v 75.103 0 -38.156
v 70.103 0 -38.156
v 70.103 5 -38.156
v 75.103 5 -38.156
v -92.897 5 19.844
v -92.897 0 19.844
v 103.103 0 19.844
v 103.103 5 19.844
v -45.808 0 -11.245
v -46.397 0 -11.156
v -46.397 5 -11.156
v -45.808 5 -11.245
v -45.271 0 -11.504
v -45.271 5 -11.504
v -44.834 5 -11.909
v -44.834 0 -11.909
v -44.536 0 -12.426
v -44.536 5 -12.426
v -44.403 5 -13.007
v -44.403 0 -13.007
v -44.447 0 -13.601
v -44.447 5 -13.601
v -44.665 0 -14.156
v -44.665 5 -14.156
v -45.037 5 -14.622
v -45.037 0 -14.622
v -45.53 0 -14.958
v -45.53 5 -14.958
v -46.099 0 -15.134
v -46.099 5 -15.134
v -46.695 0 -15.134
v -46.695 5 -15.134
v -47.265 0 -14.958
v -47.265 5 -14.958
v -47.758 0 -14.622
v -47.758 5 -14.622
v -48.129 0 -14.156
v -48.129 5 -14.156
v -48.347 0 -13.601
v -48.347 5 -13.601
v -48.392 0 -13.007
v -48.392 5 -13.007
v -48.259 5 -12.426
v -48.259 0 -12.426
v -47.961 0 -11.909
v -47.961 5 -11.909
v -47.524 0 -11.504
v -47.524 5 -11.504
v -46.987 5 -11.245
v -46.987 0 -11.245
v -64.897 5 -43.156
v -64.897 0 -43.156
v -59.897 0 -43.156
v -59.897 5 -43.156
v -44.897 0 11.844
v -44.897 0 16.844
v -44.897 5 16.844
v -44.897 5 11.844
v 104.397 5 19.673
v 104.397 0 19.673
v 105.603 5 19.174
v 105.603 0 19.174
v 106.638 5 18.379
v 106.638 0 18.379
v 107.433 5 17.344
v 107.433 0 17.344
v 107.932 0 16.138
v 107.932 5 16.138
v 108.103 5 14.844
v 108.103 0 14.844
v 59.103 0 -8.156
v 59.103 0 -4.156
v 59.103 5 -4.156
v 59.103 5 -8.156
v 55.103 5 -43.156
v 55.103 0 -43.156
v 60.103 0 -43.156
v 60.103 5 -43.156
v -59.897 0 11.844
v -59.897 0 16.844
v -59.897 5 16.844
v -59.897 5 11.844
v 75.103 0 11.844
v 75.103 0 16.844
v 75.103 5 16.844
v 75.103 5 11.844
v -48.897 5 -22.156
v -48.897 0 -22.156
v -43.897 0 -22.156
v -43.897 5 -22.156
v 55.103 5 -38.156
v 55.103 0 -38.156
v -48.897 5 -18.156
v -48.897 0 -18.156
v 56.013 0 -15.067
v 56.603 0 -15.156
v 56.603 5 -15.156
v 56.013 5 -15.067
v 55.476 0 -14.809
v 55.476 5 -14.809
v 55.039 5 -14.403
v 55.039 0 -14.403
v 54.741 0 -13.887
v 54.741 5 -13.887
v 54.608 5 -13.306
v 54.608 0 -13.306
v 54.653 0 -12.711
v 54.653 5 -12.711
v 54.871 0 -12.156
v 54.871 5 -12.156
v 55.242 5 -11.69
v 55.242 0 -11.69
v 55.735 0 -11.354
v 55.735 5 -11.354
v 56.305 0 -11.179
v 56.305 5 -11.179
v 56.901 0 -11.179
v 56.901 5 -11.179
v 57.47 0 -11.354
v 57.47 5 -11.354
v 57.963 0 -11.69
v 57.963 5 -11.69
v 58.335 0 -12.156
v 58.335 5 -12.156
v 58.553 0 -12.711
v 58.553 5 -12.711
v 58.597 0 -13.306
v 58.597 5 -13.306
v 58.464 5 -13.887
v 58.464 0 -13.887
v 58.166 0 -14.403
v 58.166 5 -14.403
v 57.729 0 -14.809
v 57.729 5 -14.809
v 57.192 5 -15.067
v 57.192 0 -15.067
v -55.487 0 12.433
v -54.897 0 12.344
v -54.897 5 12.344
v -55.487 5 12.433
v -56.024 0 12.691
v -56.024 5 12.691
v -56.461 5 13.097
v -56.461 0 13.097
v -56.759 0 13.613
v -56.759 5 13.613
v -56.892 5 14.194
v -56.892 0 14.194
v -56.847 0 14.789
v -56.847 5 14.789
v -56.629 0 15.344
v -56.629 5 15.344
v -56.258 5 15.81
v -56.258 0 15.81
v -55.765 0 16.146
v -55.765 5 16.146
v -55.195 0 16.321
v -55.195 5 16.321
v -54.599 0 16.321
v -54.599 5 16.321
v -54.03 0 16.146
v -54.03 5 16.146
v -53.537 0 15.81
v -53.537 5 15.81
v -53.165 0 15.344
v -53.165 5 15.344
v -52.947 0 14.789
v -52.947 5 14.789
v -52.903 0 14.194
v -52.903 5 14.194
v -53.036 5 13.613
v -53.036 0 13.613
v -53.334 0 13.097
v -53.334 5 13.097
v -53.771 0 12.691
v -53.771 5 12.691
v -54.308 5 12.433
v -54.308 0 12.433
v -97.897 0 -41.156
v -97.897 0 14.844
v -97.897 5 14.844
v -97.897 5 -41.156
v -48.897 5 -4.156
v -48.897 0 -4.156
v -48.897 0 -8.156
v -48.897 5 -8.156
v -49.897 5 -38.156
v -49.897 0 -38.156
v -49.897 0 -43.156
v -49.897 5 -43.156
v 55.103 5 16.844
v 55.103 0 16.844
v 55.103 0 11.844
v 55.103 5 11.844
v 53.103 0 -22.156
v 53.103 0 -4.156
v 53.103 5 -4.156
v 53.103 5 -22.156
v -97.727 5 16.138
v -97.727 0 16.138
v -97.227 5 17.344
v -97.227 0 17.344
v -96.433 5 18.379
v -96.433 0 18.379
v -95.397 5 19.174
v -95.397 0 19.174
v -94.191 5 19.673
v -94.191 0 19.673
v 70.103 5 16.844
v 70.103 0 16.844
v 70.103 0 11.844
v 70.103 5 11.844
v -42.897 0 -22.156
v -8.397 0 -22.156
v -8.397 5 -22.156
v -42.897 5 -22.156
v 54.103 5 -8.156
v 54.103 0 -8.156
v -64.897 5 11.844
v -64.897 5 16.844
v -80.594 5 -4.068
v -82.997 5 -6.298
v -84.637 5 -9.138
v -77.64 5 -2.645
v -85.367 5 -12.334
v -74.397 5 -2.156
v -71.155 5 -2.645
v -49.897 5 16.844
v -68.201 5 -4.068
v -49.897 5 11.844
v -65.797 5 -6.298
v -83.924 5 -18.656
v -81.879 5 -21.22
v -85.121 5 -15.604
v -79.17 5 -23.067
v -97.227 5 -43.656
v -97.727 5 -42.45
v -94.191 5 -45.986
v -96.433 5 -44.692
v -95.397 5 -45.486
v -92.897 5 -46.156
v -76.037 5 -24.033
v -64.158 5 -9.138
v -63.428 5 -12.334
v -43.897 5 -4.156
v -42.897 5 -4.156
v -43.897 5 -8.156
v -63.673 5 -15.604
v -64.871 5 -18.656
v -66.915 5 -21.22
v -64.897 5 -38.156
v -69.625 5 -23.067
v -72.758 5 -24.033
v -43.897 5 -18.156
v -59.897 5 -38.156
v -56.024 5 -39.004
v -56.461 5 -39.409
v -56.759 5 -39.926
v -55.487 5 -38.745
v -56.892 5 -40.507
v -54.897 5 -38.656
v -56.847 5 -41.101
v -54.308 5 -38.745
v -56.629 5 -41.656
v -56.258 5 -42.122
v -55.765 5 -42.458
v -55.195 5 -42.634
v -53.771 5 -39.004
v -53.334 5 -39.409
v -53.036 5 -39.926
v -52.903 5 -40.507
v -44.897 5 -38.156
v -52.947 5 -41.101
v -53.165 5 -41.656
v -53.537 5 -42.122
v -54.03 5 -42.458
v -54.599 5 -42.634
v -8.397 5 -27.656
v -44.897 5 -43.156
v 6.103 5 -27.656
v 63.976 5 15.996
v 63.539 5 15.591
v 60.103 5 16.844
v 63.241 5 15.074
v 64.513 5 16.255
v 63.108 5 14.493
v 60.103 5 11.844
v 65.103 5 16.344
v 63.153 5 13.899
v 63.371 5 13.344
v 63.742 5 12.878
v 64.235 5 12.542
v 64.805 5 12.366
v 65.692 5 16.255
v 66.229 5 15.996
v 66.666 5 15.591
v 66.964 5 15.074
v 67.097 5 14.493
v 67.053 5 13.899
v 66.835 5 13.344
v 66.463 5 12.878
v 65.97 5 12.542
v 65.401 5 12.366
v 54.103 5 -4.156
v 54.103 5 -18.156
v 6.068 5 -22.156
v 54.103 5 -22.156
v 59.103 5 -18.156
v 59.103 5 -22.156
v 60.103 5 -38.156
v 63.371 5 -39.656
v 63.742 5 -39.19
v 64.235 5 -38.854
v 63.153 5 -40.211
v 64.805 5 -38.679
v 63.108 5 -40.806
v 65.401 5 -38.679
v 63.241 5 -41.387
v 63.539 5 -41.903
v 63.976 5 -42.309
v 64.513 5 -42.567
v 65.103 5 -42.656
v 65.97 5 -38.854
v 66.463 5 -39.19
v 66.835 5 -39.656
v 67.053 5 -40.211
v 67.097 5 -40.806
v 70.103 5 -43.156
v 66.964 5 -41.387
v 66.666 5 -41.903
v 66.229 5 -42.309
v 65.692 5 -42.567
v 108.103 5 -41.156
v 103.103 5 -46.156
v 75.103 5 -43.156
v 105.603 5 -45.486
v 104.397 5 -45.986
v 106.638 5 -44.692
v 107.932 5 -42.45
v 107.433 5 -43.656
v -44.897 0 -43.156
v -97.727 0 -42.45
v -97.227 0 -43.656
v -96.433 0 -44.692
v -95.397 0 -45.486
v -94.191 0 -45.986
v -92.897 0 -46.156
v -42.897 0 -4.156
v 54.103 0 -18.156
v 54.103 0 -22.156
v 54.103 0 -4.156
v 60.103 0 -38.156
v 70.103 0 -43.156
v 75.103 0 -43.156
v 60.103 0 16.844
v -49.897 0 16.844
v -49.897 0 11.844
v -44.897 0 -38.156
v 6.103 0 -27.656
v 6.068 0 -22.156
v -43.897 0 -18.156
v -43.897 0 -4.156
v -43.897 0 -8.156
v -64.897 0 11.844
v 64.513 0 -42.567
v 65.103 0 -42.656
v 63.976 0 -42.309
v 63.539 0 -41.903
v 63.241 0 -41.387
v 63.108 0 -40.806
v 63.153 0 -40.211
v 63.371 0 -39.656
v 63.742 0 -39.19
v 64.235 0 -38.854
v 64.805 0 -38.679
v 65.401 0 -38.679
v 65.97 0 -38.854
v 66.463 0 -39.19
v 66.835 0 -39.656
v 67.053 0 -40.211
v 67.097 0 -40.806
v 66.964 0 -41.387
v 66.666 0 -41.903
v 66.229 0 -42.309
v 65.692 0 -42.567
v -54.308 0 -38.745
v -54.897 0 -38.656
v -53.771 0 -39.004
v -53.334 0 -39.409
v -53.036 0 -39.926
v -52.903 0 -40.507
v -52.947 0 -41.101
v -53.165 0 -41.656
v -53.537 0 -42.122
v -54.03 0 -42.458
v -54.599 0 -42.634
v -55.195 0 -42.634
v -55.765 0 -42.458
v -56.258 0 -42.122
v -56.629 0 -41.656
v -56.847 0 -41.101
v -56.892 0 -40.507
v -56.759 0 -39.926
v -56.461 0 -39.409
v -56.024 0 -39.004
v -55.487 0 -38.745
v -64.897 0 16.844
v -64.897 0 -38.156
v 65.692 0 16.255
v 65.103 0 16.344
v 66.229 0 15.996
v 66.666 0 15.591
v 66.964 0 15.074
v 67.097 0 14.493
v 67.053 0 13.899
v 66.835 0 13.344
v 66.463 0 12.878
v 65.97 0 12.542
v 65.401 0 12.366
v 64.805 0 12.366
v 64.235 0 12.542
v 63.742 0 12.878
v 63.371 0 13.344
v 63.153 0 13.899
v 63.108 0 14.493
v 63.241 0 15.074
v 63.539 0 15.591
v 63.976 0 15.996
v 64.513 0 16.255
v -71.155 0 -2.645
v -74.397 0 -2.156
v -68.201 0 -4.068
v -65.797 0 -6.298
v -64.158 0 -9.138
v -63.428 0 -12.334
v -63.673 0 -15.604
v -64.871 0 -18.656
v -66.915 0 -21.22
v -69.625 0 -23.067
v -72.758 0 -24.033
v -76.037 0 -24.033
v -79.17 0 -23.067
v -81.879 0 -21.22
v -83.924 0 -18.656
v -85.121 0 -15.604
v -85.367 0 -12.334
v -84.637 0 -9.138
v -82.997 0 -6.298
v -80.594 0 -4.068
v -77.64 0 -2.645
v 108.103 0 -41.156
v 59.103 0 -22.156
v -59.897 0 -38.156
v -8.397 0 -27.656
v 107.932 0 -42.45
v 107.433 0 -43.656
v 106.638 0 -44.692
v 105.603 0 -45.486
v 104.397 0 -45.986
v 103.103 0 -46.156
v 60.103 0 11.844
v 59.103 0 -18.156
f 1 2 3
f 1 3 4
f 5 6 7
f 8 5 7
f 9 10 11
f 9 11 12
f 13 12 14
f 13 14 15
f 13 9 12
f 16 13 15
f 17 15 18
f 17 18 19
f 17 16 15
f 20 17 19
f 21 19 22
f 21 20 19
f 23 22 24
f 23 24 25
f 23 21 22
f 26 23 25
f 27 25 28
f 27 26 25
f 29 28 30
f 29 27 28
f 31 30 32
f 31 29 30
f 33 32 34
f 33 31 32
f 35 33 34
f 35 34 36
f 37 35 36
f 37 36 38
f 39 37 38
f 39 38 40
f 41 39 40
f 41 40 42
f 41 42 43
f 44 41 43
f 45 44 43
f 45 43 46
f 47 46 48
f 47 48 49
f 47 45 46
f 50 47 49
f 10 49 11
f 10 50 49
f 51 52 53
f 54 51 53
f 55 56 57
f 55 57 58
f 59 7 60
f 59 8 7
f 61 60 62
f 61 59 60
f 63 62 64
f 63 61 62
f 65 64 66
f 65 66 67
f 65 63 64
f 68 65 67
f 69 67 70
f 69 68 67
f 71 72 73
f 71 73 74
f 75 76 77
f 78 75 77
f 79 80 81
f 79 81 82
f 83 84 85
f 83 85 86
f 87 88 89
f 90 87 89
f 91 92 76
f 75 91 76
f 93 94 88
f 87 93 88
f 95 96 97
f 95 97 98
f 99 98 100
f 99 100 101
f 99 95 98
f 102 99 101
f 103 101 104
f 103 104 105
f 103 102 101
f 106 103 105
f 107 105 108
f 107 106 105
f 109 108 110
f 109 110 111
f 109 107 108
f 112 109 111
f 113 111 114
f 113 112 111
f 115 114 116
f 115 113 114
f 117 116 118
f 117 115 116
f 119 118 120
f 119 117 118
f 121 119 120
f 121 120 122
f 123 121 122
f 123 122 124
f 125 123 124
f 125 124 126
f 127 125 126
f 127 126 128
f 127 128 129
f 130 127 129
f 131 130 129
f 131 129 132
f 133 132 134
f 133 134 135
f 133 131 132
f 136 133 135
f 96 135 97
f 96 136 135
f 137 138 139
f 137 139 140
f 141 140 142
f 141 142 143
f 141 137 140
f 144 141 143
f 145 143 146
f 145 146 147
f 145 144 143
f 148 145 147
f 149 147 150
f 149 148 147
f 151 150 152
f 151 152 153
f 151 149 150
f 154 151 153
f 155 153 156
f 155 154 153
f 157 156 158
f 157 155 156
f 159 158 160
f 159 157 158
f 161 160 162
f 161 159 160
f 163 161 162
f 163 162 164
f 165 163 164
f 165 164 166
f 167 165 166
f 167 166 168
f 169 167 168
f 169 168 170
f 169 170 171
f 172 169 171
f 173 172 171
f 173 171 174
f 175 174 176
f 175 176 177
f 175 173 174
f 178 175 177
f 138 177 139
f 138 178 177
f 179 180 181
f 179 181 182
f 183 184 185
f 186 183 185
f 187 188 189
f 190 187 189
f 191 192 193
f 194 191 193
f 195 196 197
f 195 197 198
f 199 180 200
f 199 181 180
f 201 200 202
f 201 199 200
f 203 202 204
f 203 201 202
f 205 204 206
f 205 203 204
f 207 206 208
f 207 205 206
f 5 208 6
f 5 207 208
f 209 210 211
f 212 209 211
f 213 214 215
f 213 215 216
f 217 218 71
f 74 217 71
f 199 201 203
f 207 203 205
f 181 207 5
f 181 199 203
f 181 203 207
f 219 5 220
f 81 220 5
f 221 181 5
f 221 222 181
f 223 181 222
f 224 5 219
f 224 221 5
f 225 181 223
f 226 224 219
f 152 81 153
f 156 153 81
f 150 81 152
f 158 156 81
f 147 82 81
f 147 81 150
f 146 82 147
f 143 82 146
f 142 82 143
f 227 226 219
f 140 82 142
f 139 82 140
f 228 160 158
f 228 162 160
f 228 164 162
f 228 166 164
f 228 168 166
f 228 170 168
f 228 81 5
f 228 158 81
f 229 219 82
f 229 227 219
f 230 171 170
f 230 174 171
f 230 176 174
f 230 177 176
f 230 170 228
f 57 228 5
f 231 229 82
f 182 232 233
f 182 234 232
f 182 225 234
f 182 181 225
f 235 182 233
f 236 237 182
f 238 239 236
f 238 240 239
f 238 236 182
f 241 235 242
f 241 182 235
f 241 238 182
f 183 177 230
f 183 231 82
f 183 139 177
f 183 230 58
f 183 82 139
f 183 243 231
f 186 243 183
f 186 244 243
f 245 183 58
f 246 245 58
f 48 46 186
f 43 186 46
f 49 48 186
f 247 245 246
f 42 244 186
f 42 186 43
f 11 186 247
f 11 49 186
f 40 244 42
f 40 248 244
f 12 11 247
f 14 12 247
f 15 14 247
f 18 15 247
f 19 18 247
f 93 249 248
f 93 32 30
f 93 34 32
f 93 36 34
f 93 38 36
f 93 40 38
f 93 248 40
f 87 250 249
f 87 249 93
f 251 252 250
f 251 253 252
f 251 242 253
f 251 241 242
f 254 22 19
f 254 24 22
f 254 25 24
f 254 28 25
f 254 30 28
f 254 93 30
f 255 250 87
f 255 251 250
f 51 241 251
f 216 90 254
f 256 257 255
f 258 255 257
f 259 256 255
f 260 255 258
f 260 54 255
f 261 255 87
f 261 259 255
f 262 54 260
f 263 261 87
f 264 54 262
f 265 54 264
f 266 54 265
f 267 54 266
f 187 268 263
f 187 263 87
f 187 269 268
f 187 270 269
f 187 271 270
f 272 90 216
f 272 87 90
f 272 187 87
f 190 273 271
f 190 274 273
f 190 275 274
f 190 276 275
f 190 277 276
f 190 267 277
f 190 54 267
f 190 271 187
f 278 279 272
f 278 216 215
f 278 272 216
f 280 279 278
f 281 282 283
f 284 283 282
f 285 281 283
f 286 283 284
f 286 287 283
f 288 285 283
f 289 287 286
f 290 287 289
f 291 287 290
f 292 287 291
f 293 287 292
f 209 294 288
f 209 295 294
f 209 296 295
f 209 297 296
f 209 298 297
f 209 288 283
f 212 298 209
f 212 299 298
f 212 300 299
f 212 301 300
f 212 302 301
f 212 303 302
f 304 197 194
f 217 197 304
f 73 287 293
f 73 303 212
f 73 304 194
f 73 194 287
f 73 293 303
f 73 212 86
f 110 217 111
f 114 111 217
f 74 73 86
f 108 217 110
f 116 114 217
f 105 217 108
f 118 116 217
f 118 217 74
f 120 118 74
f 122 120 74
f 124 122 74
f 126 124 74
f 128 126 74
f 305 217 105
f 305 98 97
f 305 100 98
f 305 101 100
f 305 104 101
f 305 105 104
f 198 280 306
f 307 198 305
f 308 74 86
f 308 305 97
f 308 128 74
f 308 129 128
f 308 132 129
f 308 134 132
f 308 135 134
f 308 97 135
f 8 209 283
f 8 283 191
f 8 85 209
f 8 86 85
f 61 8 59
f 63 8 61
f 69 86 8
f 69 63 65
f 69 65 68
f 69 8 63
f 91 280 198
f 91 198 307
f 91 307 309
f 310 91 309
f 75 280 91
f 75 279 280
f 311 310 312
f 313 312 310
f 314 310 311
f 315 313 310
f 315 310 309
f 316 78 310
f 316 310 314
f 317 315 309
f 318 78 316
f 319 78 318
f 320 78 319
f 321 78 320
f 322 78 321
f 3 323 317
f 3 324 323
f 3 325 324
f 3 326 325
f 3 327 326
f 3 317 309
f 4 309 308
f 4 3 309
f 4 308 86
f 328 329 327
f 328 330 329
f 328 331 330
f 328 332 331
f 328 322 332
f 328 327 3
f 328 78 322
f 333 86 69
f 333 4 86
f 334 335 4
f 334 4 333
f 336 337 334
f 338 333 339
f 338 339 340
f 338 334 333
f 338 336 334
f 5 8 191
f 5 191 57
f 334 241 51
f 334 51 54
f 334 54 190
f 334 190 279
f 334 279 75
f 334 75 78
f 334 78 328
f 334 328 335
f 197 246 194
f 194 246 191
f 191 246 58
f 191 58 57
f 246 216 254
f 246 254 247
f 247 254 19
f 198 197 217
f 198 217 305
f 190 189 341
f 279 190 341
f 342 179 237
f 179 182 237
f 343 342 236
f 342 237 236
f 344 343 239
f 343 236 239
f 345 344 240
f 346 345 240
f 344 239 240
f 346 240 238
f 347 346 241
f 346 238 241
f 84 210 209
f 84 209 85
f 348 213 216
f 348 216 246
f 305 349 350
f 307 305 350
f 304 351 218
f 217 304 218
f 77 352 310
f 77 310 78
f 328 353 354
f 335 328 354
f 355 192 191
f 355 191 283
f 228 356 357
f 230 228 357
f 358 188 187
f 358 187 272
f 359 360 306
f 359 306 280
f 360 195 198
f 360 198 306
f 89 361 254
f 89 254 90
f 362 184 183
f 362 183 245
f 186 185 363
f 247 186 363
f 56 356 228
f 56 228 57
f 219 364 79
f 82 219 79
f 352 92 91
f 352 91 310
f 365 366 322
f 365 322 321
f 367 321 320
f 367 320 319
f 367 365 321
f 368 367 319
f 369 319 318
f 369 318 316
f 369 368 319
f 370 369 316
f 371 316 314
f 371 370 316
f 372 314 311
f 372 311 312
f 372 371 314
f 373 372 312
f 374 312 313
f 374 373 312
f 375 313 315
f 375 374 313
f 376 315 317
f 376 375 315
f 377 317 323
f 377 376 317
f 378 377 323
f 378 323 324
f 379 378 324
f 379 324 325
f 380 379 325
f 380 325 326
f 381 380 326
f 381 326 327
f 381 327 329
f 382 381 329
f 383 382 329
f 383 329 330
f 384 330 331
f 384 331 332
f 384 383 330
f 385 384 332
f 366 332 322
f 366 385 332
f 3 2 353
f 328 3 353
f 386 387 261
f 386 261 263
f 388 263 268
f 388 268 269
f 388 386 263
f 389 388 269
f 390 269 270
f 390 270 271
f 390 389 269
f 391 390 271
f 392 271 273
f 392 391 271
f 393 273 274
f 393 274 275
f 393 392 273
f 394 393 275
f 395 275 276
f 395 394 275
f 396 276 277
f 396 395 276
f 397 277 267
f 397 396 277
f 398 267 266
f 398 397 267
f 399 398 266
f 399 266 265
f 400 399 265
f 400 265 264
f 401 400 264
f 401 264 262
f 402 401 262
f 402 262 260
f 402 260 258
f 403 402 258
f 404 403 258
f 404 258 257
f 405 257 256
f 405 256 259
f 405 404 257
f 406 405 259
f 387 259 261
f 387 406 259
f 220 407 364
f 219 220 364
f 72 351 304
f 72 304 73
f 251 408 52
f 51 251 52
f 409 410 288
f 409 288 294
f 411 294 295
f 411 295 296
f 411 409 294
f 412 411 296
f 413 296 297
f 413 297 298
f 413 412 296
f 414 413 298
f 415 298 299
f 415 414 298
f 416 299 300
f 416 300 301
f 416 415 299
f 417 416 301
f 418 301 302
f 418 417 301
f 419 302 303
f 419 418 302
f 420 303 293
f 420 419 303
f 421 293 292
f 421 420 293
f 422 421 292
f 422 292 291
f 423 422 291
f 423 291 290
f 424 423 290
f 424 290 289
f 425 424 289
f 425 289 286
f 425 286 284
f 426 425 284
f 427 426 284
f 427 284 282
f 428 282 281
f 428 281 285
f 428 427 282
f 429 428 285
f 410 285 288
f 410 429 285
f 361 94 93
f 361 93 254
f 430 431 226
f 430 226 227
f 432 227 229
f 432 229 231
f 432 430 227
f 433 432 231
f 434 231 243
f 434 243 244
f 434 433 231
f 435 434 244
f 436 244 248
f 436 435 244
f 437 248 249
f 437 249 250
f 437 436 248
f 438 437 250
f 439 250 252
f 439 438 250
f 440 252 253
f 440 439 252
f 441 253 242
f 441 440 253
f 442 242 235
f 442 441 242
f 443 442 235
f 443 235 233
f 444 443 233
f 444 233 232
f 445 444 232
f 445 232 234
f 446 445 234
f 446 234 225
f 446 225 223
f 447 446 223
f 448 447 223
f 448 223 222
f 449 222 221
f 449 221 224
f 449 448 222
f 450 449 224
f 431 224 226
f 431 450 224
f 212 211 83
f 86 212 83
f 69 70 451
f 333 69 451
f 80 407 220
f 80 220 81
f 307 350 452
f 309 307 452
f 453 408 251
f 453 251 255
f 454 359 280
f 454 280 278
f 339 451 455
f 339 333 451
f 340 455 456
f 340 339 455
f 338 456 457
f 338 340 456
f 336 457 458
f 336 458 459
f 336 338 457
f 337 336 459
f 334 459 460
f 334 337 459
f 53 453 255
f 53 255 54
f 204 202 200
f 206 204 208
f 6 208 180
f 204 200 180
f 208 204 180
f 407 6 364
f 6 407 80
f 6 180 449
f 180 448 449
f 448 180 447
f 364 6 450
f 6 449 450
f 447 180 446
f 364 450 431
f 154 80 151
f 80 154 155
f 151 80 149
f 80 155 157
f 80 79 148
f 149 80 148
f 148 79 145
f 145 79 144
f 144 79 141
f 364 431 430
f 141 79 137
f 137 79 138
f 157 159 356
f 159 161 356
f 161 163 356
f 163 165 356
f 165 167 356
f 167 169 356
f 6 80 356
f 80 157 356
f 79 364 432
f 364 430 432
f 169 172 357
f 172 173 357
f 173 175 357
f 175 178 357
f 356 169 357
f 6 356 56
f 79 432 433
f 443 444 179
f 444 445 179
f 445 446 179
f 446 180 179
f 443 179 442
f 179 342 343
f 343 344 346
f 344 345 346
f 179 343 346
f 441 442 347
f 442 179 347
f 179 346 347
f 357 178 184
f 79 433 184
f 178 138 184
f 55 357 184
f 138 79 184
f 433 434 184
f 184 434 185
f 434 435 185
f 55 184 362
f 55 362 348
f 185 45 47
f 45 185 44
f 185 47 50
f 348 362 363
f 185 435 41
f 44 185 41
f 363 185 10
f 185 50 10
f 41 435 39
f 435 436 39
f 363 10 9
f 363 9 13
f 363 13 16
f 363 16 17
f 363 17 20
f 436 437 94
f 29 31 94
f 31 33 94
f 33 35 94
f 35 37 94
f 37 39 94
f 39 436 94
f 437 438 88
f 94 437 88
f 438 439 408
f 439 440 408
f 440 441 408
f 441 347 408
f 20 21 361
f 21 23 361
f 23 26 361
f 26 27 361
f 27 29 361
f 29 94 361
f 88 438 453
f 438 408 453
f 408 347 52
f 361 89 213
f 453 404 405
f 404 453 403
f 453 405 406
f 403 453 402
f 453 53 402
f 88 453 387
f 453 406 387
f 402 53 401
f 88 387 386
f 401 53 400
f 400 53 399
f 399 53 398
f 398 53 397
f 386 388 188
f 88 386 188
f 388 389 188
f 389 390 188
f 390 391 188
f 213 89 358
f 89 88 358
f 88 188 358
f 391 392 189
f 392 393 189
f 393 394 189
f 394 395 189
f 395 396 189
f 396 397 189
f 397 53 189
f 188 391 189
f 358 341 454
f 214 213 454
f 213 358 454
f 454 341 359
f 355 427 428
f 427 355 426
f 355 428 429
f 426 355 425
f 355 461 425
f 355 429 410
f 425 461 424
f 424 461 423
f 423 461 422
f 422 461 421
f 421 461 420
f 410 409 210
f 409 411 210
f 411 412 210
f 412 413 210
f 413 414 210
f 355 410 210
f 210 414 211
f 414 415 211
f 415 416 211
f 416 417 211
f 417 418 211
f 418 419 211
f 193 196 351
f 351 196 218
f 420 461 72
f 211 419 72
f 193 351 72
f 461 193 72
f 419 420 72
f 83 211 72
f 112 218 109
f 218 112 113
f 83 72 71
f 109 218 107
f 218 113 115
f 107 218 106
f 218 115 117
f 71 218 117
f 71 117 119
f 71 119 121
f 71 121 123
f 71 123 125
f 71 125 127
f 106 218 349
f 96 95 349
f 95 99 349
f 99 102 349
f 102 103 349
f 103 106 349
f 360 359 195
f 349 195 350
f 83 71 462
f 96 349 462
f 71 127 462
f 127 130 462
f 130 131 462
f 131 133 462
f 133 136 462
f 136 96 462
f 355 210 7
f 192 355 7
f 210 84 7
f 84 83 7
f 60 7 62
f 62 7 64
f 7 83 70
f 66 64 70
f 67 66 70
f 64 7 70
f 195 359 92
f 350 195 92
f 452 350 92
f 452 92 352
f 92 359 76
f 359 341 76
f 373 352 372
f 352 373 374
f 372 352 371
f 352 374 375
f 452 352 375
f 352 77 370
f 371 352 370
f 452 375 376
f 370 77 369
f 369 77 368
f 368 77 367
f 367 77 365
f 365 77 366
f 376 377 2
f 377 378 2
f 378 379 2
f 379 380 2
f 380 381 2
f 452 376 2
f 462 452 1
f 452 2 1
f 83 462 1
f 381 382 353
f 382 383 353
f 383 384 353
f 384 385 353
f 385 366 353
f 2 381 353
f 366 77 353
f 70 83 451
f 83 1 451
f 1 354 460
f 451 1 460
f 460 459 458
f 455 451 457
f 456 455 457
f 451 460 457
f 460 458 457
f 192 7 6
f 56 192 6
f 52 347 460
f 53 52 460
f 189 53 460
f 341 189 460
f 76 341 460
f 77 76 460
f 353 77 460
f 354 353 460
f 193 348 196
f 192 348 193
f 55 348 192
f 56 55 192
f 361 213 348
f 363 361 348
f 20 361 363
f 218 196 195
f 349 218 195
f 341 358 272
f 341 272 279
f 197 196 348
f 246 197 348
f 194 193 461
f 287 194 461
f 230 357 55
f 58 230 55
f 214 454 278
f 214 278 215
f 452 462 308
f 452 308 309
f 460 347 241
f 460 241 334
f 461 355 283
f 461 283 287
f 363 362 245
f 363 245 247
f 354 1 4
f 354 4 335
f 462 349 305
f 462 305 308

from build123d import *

# Parameters (mm, degrees)
SKETCH1_W           = 206
SKETCH1_H           = 66
SKETCH1_R           = 2
SKETCH1_R_2         = 11
SKETCH1_W_2         = 5
SKETCH1_H_2         = 5
SKETCH1_H_3         = 4
BOSS_EXTRUDE4_DEPTH = 5
FILLET9_R           = 5


with BuildPart() as part:
    # Sketch1 → Boss-Extrude4 (new body)
    with BuildSketch(Plane(origin=(0, 0, 0), x_dir=(1, 0, 0), z_dir=(0, 1, 0))):
        with Locations((5.102707087, 13.156325227)):
            Rectangle(SKETCH1_W, SKETCH1_H)
        with Locations(Location((-54.897292913, 40.656325227, 0), (0, 0, 270))):
            Circle(SKETCH1_R, mode=Mode.SUBTRACT)
        with Locations(Location((-54.897292913, -14.343674773, 0), (0, 0, 90))):
            Circle(SKETCH1_R, mode=Mode.SUBTRACT)
        with Locations(Location((65.102707087, -14.343674773, 0), (0, 0, 270))):
            Circle(SKETCH1_R, mode=Mode.SUBTRACT)
        with Locations(Location((65.102707087, 40.656325227, 0), (0, 0, 90))):
            Circle(SKETCH1_R, mode=Mode.SUBTRACT)
        with Locations(Location((-74.397292913, 13.156325227, 0), (0, 0, 270))):
            Circle(SKETCH1_R_2, mode=Mode.SUBTRACT)
        with Locations(Location((-46.397292913, 13.156325227, 0), (0, 0, 270))):
            Circle(SKETCH1_R, mode=Mode.SUBTRACT)
        with Locations(Location((56.602707087, 13.156325227, 0), (0, 0, 90))):
            Circle(SKETCH1_R, mode=Mode.SUBTRACT)
        with Locations((57.602707087, 40.656325227)):
            Rectangle(SKETCH1_W_2, SKETCH1_H_2, mode=Mode.SUBTRACT)
        with Locations((-62.397292913, 40.656325227)):
            Rectangle(SKETCH1_W_2, SKETCH1_H_2, mode=Mode.SUBTRACT)
        with Locations((-47.397292913, 40.656325227)):
            Rectangle(SKETCH1_W_2, SKETCH1_H_2, mode=Mode.SUBTRACT)
        with Locations((72.602707087, 40.656325227)):
            Rectangle(SKETCH1_W_2, SKETCH1_H_2, mode=Mode.SUBTRACT)
        with Locations((72.602707087, -14.343674773)):
            Rectangle(SKETCH1_W_2, SKETCH1_H_2, mode=Mode.SUBTRACT)
        with Locations((57.602707087, -14.343674773)):
            Rectangle(SKETCH1_W_2, SKETCH1_H_2, mode=Mode.SUBTRACT)
        with Locations((-47.397292913, -14.343674773)):
            Rectangle(SKETCH1_W_2, SKETCH1_H_2, mode=Mode.SUBTRACT)
        with Locations((-62.397292913, -14.343674773)):
            Rectangle(SKETCH1_W_2, SKETCH1_H_2, mode=Mode.SUBTRACT)
        with Locations((-46.397292913, 20.156325227)):
            Rectangle(SKETCH1_W_2, SKETCH1_H_3, mode=Mode.SUBTRACT)
        with Locations((-46.397292913, 6.156325227)):
            Rectangle(SKETCH1_W_2, SKETCH1_H_3, mode=Mode.SUBTRACT)
        with Locations((56.602707087, 6.156325227)):
            Rectangle(SKETCH1_W_2, SKETCH1_H_3, mode=Mode.SUBTRACT)
        with Locations((56.602707087, 20.156325227)):
            Rectangle(SKETCH1_W_2, SKETCH1_H_3, mode=Mode.SUBTRACT)
        Polygon((6.068183228, 4.156325227), (53.102707087, 4.156325227), (53.102707087, 22.156325227), (6.068183228, 22.156325227), (6.102707086, 27.656216871), (-8.397292913, 27.656325227), (-8.397292913, 22.156325227), (-42.897292913, 22.156325227), (-42.897292913, 4.156325227), (-8.397292913, 4.156325227), align=None, mode=Mode.SUBTRACT)
    extrude(amount=BOSS_EXTRUDE4_DEPTH)

    # Fillet9
    fillet9_edges = [part.edges().sort_by_distance(p)[0] for p in [
        (-97.897292913, 2.5, -46.156325227),
        (108.102707087, 2.5, -46.156325227),
        (108.102707087, 2.5, 19.843674773),
        (-97.897292913, 2.5, 19.843674773),
    ]]
    fillet(fillet9_edges, radius=FILLET9_R)


solid = part.part
